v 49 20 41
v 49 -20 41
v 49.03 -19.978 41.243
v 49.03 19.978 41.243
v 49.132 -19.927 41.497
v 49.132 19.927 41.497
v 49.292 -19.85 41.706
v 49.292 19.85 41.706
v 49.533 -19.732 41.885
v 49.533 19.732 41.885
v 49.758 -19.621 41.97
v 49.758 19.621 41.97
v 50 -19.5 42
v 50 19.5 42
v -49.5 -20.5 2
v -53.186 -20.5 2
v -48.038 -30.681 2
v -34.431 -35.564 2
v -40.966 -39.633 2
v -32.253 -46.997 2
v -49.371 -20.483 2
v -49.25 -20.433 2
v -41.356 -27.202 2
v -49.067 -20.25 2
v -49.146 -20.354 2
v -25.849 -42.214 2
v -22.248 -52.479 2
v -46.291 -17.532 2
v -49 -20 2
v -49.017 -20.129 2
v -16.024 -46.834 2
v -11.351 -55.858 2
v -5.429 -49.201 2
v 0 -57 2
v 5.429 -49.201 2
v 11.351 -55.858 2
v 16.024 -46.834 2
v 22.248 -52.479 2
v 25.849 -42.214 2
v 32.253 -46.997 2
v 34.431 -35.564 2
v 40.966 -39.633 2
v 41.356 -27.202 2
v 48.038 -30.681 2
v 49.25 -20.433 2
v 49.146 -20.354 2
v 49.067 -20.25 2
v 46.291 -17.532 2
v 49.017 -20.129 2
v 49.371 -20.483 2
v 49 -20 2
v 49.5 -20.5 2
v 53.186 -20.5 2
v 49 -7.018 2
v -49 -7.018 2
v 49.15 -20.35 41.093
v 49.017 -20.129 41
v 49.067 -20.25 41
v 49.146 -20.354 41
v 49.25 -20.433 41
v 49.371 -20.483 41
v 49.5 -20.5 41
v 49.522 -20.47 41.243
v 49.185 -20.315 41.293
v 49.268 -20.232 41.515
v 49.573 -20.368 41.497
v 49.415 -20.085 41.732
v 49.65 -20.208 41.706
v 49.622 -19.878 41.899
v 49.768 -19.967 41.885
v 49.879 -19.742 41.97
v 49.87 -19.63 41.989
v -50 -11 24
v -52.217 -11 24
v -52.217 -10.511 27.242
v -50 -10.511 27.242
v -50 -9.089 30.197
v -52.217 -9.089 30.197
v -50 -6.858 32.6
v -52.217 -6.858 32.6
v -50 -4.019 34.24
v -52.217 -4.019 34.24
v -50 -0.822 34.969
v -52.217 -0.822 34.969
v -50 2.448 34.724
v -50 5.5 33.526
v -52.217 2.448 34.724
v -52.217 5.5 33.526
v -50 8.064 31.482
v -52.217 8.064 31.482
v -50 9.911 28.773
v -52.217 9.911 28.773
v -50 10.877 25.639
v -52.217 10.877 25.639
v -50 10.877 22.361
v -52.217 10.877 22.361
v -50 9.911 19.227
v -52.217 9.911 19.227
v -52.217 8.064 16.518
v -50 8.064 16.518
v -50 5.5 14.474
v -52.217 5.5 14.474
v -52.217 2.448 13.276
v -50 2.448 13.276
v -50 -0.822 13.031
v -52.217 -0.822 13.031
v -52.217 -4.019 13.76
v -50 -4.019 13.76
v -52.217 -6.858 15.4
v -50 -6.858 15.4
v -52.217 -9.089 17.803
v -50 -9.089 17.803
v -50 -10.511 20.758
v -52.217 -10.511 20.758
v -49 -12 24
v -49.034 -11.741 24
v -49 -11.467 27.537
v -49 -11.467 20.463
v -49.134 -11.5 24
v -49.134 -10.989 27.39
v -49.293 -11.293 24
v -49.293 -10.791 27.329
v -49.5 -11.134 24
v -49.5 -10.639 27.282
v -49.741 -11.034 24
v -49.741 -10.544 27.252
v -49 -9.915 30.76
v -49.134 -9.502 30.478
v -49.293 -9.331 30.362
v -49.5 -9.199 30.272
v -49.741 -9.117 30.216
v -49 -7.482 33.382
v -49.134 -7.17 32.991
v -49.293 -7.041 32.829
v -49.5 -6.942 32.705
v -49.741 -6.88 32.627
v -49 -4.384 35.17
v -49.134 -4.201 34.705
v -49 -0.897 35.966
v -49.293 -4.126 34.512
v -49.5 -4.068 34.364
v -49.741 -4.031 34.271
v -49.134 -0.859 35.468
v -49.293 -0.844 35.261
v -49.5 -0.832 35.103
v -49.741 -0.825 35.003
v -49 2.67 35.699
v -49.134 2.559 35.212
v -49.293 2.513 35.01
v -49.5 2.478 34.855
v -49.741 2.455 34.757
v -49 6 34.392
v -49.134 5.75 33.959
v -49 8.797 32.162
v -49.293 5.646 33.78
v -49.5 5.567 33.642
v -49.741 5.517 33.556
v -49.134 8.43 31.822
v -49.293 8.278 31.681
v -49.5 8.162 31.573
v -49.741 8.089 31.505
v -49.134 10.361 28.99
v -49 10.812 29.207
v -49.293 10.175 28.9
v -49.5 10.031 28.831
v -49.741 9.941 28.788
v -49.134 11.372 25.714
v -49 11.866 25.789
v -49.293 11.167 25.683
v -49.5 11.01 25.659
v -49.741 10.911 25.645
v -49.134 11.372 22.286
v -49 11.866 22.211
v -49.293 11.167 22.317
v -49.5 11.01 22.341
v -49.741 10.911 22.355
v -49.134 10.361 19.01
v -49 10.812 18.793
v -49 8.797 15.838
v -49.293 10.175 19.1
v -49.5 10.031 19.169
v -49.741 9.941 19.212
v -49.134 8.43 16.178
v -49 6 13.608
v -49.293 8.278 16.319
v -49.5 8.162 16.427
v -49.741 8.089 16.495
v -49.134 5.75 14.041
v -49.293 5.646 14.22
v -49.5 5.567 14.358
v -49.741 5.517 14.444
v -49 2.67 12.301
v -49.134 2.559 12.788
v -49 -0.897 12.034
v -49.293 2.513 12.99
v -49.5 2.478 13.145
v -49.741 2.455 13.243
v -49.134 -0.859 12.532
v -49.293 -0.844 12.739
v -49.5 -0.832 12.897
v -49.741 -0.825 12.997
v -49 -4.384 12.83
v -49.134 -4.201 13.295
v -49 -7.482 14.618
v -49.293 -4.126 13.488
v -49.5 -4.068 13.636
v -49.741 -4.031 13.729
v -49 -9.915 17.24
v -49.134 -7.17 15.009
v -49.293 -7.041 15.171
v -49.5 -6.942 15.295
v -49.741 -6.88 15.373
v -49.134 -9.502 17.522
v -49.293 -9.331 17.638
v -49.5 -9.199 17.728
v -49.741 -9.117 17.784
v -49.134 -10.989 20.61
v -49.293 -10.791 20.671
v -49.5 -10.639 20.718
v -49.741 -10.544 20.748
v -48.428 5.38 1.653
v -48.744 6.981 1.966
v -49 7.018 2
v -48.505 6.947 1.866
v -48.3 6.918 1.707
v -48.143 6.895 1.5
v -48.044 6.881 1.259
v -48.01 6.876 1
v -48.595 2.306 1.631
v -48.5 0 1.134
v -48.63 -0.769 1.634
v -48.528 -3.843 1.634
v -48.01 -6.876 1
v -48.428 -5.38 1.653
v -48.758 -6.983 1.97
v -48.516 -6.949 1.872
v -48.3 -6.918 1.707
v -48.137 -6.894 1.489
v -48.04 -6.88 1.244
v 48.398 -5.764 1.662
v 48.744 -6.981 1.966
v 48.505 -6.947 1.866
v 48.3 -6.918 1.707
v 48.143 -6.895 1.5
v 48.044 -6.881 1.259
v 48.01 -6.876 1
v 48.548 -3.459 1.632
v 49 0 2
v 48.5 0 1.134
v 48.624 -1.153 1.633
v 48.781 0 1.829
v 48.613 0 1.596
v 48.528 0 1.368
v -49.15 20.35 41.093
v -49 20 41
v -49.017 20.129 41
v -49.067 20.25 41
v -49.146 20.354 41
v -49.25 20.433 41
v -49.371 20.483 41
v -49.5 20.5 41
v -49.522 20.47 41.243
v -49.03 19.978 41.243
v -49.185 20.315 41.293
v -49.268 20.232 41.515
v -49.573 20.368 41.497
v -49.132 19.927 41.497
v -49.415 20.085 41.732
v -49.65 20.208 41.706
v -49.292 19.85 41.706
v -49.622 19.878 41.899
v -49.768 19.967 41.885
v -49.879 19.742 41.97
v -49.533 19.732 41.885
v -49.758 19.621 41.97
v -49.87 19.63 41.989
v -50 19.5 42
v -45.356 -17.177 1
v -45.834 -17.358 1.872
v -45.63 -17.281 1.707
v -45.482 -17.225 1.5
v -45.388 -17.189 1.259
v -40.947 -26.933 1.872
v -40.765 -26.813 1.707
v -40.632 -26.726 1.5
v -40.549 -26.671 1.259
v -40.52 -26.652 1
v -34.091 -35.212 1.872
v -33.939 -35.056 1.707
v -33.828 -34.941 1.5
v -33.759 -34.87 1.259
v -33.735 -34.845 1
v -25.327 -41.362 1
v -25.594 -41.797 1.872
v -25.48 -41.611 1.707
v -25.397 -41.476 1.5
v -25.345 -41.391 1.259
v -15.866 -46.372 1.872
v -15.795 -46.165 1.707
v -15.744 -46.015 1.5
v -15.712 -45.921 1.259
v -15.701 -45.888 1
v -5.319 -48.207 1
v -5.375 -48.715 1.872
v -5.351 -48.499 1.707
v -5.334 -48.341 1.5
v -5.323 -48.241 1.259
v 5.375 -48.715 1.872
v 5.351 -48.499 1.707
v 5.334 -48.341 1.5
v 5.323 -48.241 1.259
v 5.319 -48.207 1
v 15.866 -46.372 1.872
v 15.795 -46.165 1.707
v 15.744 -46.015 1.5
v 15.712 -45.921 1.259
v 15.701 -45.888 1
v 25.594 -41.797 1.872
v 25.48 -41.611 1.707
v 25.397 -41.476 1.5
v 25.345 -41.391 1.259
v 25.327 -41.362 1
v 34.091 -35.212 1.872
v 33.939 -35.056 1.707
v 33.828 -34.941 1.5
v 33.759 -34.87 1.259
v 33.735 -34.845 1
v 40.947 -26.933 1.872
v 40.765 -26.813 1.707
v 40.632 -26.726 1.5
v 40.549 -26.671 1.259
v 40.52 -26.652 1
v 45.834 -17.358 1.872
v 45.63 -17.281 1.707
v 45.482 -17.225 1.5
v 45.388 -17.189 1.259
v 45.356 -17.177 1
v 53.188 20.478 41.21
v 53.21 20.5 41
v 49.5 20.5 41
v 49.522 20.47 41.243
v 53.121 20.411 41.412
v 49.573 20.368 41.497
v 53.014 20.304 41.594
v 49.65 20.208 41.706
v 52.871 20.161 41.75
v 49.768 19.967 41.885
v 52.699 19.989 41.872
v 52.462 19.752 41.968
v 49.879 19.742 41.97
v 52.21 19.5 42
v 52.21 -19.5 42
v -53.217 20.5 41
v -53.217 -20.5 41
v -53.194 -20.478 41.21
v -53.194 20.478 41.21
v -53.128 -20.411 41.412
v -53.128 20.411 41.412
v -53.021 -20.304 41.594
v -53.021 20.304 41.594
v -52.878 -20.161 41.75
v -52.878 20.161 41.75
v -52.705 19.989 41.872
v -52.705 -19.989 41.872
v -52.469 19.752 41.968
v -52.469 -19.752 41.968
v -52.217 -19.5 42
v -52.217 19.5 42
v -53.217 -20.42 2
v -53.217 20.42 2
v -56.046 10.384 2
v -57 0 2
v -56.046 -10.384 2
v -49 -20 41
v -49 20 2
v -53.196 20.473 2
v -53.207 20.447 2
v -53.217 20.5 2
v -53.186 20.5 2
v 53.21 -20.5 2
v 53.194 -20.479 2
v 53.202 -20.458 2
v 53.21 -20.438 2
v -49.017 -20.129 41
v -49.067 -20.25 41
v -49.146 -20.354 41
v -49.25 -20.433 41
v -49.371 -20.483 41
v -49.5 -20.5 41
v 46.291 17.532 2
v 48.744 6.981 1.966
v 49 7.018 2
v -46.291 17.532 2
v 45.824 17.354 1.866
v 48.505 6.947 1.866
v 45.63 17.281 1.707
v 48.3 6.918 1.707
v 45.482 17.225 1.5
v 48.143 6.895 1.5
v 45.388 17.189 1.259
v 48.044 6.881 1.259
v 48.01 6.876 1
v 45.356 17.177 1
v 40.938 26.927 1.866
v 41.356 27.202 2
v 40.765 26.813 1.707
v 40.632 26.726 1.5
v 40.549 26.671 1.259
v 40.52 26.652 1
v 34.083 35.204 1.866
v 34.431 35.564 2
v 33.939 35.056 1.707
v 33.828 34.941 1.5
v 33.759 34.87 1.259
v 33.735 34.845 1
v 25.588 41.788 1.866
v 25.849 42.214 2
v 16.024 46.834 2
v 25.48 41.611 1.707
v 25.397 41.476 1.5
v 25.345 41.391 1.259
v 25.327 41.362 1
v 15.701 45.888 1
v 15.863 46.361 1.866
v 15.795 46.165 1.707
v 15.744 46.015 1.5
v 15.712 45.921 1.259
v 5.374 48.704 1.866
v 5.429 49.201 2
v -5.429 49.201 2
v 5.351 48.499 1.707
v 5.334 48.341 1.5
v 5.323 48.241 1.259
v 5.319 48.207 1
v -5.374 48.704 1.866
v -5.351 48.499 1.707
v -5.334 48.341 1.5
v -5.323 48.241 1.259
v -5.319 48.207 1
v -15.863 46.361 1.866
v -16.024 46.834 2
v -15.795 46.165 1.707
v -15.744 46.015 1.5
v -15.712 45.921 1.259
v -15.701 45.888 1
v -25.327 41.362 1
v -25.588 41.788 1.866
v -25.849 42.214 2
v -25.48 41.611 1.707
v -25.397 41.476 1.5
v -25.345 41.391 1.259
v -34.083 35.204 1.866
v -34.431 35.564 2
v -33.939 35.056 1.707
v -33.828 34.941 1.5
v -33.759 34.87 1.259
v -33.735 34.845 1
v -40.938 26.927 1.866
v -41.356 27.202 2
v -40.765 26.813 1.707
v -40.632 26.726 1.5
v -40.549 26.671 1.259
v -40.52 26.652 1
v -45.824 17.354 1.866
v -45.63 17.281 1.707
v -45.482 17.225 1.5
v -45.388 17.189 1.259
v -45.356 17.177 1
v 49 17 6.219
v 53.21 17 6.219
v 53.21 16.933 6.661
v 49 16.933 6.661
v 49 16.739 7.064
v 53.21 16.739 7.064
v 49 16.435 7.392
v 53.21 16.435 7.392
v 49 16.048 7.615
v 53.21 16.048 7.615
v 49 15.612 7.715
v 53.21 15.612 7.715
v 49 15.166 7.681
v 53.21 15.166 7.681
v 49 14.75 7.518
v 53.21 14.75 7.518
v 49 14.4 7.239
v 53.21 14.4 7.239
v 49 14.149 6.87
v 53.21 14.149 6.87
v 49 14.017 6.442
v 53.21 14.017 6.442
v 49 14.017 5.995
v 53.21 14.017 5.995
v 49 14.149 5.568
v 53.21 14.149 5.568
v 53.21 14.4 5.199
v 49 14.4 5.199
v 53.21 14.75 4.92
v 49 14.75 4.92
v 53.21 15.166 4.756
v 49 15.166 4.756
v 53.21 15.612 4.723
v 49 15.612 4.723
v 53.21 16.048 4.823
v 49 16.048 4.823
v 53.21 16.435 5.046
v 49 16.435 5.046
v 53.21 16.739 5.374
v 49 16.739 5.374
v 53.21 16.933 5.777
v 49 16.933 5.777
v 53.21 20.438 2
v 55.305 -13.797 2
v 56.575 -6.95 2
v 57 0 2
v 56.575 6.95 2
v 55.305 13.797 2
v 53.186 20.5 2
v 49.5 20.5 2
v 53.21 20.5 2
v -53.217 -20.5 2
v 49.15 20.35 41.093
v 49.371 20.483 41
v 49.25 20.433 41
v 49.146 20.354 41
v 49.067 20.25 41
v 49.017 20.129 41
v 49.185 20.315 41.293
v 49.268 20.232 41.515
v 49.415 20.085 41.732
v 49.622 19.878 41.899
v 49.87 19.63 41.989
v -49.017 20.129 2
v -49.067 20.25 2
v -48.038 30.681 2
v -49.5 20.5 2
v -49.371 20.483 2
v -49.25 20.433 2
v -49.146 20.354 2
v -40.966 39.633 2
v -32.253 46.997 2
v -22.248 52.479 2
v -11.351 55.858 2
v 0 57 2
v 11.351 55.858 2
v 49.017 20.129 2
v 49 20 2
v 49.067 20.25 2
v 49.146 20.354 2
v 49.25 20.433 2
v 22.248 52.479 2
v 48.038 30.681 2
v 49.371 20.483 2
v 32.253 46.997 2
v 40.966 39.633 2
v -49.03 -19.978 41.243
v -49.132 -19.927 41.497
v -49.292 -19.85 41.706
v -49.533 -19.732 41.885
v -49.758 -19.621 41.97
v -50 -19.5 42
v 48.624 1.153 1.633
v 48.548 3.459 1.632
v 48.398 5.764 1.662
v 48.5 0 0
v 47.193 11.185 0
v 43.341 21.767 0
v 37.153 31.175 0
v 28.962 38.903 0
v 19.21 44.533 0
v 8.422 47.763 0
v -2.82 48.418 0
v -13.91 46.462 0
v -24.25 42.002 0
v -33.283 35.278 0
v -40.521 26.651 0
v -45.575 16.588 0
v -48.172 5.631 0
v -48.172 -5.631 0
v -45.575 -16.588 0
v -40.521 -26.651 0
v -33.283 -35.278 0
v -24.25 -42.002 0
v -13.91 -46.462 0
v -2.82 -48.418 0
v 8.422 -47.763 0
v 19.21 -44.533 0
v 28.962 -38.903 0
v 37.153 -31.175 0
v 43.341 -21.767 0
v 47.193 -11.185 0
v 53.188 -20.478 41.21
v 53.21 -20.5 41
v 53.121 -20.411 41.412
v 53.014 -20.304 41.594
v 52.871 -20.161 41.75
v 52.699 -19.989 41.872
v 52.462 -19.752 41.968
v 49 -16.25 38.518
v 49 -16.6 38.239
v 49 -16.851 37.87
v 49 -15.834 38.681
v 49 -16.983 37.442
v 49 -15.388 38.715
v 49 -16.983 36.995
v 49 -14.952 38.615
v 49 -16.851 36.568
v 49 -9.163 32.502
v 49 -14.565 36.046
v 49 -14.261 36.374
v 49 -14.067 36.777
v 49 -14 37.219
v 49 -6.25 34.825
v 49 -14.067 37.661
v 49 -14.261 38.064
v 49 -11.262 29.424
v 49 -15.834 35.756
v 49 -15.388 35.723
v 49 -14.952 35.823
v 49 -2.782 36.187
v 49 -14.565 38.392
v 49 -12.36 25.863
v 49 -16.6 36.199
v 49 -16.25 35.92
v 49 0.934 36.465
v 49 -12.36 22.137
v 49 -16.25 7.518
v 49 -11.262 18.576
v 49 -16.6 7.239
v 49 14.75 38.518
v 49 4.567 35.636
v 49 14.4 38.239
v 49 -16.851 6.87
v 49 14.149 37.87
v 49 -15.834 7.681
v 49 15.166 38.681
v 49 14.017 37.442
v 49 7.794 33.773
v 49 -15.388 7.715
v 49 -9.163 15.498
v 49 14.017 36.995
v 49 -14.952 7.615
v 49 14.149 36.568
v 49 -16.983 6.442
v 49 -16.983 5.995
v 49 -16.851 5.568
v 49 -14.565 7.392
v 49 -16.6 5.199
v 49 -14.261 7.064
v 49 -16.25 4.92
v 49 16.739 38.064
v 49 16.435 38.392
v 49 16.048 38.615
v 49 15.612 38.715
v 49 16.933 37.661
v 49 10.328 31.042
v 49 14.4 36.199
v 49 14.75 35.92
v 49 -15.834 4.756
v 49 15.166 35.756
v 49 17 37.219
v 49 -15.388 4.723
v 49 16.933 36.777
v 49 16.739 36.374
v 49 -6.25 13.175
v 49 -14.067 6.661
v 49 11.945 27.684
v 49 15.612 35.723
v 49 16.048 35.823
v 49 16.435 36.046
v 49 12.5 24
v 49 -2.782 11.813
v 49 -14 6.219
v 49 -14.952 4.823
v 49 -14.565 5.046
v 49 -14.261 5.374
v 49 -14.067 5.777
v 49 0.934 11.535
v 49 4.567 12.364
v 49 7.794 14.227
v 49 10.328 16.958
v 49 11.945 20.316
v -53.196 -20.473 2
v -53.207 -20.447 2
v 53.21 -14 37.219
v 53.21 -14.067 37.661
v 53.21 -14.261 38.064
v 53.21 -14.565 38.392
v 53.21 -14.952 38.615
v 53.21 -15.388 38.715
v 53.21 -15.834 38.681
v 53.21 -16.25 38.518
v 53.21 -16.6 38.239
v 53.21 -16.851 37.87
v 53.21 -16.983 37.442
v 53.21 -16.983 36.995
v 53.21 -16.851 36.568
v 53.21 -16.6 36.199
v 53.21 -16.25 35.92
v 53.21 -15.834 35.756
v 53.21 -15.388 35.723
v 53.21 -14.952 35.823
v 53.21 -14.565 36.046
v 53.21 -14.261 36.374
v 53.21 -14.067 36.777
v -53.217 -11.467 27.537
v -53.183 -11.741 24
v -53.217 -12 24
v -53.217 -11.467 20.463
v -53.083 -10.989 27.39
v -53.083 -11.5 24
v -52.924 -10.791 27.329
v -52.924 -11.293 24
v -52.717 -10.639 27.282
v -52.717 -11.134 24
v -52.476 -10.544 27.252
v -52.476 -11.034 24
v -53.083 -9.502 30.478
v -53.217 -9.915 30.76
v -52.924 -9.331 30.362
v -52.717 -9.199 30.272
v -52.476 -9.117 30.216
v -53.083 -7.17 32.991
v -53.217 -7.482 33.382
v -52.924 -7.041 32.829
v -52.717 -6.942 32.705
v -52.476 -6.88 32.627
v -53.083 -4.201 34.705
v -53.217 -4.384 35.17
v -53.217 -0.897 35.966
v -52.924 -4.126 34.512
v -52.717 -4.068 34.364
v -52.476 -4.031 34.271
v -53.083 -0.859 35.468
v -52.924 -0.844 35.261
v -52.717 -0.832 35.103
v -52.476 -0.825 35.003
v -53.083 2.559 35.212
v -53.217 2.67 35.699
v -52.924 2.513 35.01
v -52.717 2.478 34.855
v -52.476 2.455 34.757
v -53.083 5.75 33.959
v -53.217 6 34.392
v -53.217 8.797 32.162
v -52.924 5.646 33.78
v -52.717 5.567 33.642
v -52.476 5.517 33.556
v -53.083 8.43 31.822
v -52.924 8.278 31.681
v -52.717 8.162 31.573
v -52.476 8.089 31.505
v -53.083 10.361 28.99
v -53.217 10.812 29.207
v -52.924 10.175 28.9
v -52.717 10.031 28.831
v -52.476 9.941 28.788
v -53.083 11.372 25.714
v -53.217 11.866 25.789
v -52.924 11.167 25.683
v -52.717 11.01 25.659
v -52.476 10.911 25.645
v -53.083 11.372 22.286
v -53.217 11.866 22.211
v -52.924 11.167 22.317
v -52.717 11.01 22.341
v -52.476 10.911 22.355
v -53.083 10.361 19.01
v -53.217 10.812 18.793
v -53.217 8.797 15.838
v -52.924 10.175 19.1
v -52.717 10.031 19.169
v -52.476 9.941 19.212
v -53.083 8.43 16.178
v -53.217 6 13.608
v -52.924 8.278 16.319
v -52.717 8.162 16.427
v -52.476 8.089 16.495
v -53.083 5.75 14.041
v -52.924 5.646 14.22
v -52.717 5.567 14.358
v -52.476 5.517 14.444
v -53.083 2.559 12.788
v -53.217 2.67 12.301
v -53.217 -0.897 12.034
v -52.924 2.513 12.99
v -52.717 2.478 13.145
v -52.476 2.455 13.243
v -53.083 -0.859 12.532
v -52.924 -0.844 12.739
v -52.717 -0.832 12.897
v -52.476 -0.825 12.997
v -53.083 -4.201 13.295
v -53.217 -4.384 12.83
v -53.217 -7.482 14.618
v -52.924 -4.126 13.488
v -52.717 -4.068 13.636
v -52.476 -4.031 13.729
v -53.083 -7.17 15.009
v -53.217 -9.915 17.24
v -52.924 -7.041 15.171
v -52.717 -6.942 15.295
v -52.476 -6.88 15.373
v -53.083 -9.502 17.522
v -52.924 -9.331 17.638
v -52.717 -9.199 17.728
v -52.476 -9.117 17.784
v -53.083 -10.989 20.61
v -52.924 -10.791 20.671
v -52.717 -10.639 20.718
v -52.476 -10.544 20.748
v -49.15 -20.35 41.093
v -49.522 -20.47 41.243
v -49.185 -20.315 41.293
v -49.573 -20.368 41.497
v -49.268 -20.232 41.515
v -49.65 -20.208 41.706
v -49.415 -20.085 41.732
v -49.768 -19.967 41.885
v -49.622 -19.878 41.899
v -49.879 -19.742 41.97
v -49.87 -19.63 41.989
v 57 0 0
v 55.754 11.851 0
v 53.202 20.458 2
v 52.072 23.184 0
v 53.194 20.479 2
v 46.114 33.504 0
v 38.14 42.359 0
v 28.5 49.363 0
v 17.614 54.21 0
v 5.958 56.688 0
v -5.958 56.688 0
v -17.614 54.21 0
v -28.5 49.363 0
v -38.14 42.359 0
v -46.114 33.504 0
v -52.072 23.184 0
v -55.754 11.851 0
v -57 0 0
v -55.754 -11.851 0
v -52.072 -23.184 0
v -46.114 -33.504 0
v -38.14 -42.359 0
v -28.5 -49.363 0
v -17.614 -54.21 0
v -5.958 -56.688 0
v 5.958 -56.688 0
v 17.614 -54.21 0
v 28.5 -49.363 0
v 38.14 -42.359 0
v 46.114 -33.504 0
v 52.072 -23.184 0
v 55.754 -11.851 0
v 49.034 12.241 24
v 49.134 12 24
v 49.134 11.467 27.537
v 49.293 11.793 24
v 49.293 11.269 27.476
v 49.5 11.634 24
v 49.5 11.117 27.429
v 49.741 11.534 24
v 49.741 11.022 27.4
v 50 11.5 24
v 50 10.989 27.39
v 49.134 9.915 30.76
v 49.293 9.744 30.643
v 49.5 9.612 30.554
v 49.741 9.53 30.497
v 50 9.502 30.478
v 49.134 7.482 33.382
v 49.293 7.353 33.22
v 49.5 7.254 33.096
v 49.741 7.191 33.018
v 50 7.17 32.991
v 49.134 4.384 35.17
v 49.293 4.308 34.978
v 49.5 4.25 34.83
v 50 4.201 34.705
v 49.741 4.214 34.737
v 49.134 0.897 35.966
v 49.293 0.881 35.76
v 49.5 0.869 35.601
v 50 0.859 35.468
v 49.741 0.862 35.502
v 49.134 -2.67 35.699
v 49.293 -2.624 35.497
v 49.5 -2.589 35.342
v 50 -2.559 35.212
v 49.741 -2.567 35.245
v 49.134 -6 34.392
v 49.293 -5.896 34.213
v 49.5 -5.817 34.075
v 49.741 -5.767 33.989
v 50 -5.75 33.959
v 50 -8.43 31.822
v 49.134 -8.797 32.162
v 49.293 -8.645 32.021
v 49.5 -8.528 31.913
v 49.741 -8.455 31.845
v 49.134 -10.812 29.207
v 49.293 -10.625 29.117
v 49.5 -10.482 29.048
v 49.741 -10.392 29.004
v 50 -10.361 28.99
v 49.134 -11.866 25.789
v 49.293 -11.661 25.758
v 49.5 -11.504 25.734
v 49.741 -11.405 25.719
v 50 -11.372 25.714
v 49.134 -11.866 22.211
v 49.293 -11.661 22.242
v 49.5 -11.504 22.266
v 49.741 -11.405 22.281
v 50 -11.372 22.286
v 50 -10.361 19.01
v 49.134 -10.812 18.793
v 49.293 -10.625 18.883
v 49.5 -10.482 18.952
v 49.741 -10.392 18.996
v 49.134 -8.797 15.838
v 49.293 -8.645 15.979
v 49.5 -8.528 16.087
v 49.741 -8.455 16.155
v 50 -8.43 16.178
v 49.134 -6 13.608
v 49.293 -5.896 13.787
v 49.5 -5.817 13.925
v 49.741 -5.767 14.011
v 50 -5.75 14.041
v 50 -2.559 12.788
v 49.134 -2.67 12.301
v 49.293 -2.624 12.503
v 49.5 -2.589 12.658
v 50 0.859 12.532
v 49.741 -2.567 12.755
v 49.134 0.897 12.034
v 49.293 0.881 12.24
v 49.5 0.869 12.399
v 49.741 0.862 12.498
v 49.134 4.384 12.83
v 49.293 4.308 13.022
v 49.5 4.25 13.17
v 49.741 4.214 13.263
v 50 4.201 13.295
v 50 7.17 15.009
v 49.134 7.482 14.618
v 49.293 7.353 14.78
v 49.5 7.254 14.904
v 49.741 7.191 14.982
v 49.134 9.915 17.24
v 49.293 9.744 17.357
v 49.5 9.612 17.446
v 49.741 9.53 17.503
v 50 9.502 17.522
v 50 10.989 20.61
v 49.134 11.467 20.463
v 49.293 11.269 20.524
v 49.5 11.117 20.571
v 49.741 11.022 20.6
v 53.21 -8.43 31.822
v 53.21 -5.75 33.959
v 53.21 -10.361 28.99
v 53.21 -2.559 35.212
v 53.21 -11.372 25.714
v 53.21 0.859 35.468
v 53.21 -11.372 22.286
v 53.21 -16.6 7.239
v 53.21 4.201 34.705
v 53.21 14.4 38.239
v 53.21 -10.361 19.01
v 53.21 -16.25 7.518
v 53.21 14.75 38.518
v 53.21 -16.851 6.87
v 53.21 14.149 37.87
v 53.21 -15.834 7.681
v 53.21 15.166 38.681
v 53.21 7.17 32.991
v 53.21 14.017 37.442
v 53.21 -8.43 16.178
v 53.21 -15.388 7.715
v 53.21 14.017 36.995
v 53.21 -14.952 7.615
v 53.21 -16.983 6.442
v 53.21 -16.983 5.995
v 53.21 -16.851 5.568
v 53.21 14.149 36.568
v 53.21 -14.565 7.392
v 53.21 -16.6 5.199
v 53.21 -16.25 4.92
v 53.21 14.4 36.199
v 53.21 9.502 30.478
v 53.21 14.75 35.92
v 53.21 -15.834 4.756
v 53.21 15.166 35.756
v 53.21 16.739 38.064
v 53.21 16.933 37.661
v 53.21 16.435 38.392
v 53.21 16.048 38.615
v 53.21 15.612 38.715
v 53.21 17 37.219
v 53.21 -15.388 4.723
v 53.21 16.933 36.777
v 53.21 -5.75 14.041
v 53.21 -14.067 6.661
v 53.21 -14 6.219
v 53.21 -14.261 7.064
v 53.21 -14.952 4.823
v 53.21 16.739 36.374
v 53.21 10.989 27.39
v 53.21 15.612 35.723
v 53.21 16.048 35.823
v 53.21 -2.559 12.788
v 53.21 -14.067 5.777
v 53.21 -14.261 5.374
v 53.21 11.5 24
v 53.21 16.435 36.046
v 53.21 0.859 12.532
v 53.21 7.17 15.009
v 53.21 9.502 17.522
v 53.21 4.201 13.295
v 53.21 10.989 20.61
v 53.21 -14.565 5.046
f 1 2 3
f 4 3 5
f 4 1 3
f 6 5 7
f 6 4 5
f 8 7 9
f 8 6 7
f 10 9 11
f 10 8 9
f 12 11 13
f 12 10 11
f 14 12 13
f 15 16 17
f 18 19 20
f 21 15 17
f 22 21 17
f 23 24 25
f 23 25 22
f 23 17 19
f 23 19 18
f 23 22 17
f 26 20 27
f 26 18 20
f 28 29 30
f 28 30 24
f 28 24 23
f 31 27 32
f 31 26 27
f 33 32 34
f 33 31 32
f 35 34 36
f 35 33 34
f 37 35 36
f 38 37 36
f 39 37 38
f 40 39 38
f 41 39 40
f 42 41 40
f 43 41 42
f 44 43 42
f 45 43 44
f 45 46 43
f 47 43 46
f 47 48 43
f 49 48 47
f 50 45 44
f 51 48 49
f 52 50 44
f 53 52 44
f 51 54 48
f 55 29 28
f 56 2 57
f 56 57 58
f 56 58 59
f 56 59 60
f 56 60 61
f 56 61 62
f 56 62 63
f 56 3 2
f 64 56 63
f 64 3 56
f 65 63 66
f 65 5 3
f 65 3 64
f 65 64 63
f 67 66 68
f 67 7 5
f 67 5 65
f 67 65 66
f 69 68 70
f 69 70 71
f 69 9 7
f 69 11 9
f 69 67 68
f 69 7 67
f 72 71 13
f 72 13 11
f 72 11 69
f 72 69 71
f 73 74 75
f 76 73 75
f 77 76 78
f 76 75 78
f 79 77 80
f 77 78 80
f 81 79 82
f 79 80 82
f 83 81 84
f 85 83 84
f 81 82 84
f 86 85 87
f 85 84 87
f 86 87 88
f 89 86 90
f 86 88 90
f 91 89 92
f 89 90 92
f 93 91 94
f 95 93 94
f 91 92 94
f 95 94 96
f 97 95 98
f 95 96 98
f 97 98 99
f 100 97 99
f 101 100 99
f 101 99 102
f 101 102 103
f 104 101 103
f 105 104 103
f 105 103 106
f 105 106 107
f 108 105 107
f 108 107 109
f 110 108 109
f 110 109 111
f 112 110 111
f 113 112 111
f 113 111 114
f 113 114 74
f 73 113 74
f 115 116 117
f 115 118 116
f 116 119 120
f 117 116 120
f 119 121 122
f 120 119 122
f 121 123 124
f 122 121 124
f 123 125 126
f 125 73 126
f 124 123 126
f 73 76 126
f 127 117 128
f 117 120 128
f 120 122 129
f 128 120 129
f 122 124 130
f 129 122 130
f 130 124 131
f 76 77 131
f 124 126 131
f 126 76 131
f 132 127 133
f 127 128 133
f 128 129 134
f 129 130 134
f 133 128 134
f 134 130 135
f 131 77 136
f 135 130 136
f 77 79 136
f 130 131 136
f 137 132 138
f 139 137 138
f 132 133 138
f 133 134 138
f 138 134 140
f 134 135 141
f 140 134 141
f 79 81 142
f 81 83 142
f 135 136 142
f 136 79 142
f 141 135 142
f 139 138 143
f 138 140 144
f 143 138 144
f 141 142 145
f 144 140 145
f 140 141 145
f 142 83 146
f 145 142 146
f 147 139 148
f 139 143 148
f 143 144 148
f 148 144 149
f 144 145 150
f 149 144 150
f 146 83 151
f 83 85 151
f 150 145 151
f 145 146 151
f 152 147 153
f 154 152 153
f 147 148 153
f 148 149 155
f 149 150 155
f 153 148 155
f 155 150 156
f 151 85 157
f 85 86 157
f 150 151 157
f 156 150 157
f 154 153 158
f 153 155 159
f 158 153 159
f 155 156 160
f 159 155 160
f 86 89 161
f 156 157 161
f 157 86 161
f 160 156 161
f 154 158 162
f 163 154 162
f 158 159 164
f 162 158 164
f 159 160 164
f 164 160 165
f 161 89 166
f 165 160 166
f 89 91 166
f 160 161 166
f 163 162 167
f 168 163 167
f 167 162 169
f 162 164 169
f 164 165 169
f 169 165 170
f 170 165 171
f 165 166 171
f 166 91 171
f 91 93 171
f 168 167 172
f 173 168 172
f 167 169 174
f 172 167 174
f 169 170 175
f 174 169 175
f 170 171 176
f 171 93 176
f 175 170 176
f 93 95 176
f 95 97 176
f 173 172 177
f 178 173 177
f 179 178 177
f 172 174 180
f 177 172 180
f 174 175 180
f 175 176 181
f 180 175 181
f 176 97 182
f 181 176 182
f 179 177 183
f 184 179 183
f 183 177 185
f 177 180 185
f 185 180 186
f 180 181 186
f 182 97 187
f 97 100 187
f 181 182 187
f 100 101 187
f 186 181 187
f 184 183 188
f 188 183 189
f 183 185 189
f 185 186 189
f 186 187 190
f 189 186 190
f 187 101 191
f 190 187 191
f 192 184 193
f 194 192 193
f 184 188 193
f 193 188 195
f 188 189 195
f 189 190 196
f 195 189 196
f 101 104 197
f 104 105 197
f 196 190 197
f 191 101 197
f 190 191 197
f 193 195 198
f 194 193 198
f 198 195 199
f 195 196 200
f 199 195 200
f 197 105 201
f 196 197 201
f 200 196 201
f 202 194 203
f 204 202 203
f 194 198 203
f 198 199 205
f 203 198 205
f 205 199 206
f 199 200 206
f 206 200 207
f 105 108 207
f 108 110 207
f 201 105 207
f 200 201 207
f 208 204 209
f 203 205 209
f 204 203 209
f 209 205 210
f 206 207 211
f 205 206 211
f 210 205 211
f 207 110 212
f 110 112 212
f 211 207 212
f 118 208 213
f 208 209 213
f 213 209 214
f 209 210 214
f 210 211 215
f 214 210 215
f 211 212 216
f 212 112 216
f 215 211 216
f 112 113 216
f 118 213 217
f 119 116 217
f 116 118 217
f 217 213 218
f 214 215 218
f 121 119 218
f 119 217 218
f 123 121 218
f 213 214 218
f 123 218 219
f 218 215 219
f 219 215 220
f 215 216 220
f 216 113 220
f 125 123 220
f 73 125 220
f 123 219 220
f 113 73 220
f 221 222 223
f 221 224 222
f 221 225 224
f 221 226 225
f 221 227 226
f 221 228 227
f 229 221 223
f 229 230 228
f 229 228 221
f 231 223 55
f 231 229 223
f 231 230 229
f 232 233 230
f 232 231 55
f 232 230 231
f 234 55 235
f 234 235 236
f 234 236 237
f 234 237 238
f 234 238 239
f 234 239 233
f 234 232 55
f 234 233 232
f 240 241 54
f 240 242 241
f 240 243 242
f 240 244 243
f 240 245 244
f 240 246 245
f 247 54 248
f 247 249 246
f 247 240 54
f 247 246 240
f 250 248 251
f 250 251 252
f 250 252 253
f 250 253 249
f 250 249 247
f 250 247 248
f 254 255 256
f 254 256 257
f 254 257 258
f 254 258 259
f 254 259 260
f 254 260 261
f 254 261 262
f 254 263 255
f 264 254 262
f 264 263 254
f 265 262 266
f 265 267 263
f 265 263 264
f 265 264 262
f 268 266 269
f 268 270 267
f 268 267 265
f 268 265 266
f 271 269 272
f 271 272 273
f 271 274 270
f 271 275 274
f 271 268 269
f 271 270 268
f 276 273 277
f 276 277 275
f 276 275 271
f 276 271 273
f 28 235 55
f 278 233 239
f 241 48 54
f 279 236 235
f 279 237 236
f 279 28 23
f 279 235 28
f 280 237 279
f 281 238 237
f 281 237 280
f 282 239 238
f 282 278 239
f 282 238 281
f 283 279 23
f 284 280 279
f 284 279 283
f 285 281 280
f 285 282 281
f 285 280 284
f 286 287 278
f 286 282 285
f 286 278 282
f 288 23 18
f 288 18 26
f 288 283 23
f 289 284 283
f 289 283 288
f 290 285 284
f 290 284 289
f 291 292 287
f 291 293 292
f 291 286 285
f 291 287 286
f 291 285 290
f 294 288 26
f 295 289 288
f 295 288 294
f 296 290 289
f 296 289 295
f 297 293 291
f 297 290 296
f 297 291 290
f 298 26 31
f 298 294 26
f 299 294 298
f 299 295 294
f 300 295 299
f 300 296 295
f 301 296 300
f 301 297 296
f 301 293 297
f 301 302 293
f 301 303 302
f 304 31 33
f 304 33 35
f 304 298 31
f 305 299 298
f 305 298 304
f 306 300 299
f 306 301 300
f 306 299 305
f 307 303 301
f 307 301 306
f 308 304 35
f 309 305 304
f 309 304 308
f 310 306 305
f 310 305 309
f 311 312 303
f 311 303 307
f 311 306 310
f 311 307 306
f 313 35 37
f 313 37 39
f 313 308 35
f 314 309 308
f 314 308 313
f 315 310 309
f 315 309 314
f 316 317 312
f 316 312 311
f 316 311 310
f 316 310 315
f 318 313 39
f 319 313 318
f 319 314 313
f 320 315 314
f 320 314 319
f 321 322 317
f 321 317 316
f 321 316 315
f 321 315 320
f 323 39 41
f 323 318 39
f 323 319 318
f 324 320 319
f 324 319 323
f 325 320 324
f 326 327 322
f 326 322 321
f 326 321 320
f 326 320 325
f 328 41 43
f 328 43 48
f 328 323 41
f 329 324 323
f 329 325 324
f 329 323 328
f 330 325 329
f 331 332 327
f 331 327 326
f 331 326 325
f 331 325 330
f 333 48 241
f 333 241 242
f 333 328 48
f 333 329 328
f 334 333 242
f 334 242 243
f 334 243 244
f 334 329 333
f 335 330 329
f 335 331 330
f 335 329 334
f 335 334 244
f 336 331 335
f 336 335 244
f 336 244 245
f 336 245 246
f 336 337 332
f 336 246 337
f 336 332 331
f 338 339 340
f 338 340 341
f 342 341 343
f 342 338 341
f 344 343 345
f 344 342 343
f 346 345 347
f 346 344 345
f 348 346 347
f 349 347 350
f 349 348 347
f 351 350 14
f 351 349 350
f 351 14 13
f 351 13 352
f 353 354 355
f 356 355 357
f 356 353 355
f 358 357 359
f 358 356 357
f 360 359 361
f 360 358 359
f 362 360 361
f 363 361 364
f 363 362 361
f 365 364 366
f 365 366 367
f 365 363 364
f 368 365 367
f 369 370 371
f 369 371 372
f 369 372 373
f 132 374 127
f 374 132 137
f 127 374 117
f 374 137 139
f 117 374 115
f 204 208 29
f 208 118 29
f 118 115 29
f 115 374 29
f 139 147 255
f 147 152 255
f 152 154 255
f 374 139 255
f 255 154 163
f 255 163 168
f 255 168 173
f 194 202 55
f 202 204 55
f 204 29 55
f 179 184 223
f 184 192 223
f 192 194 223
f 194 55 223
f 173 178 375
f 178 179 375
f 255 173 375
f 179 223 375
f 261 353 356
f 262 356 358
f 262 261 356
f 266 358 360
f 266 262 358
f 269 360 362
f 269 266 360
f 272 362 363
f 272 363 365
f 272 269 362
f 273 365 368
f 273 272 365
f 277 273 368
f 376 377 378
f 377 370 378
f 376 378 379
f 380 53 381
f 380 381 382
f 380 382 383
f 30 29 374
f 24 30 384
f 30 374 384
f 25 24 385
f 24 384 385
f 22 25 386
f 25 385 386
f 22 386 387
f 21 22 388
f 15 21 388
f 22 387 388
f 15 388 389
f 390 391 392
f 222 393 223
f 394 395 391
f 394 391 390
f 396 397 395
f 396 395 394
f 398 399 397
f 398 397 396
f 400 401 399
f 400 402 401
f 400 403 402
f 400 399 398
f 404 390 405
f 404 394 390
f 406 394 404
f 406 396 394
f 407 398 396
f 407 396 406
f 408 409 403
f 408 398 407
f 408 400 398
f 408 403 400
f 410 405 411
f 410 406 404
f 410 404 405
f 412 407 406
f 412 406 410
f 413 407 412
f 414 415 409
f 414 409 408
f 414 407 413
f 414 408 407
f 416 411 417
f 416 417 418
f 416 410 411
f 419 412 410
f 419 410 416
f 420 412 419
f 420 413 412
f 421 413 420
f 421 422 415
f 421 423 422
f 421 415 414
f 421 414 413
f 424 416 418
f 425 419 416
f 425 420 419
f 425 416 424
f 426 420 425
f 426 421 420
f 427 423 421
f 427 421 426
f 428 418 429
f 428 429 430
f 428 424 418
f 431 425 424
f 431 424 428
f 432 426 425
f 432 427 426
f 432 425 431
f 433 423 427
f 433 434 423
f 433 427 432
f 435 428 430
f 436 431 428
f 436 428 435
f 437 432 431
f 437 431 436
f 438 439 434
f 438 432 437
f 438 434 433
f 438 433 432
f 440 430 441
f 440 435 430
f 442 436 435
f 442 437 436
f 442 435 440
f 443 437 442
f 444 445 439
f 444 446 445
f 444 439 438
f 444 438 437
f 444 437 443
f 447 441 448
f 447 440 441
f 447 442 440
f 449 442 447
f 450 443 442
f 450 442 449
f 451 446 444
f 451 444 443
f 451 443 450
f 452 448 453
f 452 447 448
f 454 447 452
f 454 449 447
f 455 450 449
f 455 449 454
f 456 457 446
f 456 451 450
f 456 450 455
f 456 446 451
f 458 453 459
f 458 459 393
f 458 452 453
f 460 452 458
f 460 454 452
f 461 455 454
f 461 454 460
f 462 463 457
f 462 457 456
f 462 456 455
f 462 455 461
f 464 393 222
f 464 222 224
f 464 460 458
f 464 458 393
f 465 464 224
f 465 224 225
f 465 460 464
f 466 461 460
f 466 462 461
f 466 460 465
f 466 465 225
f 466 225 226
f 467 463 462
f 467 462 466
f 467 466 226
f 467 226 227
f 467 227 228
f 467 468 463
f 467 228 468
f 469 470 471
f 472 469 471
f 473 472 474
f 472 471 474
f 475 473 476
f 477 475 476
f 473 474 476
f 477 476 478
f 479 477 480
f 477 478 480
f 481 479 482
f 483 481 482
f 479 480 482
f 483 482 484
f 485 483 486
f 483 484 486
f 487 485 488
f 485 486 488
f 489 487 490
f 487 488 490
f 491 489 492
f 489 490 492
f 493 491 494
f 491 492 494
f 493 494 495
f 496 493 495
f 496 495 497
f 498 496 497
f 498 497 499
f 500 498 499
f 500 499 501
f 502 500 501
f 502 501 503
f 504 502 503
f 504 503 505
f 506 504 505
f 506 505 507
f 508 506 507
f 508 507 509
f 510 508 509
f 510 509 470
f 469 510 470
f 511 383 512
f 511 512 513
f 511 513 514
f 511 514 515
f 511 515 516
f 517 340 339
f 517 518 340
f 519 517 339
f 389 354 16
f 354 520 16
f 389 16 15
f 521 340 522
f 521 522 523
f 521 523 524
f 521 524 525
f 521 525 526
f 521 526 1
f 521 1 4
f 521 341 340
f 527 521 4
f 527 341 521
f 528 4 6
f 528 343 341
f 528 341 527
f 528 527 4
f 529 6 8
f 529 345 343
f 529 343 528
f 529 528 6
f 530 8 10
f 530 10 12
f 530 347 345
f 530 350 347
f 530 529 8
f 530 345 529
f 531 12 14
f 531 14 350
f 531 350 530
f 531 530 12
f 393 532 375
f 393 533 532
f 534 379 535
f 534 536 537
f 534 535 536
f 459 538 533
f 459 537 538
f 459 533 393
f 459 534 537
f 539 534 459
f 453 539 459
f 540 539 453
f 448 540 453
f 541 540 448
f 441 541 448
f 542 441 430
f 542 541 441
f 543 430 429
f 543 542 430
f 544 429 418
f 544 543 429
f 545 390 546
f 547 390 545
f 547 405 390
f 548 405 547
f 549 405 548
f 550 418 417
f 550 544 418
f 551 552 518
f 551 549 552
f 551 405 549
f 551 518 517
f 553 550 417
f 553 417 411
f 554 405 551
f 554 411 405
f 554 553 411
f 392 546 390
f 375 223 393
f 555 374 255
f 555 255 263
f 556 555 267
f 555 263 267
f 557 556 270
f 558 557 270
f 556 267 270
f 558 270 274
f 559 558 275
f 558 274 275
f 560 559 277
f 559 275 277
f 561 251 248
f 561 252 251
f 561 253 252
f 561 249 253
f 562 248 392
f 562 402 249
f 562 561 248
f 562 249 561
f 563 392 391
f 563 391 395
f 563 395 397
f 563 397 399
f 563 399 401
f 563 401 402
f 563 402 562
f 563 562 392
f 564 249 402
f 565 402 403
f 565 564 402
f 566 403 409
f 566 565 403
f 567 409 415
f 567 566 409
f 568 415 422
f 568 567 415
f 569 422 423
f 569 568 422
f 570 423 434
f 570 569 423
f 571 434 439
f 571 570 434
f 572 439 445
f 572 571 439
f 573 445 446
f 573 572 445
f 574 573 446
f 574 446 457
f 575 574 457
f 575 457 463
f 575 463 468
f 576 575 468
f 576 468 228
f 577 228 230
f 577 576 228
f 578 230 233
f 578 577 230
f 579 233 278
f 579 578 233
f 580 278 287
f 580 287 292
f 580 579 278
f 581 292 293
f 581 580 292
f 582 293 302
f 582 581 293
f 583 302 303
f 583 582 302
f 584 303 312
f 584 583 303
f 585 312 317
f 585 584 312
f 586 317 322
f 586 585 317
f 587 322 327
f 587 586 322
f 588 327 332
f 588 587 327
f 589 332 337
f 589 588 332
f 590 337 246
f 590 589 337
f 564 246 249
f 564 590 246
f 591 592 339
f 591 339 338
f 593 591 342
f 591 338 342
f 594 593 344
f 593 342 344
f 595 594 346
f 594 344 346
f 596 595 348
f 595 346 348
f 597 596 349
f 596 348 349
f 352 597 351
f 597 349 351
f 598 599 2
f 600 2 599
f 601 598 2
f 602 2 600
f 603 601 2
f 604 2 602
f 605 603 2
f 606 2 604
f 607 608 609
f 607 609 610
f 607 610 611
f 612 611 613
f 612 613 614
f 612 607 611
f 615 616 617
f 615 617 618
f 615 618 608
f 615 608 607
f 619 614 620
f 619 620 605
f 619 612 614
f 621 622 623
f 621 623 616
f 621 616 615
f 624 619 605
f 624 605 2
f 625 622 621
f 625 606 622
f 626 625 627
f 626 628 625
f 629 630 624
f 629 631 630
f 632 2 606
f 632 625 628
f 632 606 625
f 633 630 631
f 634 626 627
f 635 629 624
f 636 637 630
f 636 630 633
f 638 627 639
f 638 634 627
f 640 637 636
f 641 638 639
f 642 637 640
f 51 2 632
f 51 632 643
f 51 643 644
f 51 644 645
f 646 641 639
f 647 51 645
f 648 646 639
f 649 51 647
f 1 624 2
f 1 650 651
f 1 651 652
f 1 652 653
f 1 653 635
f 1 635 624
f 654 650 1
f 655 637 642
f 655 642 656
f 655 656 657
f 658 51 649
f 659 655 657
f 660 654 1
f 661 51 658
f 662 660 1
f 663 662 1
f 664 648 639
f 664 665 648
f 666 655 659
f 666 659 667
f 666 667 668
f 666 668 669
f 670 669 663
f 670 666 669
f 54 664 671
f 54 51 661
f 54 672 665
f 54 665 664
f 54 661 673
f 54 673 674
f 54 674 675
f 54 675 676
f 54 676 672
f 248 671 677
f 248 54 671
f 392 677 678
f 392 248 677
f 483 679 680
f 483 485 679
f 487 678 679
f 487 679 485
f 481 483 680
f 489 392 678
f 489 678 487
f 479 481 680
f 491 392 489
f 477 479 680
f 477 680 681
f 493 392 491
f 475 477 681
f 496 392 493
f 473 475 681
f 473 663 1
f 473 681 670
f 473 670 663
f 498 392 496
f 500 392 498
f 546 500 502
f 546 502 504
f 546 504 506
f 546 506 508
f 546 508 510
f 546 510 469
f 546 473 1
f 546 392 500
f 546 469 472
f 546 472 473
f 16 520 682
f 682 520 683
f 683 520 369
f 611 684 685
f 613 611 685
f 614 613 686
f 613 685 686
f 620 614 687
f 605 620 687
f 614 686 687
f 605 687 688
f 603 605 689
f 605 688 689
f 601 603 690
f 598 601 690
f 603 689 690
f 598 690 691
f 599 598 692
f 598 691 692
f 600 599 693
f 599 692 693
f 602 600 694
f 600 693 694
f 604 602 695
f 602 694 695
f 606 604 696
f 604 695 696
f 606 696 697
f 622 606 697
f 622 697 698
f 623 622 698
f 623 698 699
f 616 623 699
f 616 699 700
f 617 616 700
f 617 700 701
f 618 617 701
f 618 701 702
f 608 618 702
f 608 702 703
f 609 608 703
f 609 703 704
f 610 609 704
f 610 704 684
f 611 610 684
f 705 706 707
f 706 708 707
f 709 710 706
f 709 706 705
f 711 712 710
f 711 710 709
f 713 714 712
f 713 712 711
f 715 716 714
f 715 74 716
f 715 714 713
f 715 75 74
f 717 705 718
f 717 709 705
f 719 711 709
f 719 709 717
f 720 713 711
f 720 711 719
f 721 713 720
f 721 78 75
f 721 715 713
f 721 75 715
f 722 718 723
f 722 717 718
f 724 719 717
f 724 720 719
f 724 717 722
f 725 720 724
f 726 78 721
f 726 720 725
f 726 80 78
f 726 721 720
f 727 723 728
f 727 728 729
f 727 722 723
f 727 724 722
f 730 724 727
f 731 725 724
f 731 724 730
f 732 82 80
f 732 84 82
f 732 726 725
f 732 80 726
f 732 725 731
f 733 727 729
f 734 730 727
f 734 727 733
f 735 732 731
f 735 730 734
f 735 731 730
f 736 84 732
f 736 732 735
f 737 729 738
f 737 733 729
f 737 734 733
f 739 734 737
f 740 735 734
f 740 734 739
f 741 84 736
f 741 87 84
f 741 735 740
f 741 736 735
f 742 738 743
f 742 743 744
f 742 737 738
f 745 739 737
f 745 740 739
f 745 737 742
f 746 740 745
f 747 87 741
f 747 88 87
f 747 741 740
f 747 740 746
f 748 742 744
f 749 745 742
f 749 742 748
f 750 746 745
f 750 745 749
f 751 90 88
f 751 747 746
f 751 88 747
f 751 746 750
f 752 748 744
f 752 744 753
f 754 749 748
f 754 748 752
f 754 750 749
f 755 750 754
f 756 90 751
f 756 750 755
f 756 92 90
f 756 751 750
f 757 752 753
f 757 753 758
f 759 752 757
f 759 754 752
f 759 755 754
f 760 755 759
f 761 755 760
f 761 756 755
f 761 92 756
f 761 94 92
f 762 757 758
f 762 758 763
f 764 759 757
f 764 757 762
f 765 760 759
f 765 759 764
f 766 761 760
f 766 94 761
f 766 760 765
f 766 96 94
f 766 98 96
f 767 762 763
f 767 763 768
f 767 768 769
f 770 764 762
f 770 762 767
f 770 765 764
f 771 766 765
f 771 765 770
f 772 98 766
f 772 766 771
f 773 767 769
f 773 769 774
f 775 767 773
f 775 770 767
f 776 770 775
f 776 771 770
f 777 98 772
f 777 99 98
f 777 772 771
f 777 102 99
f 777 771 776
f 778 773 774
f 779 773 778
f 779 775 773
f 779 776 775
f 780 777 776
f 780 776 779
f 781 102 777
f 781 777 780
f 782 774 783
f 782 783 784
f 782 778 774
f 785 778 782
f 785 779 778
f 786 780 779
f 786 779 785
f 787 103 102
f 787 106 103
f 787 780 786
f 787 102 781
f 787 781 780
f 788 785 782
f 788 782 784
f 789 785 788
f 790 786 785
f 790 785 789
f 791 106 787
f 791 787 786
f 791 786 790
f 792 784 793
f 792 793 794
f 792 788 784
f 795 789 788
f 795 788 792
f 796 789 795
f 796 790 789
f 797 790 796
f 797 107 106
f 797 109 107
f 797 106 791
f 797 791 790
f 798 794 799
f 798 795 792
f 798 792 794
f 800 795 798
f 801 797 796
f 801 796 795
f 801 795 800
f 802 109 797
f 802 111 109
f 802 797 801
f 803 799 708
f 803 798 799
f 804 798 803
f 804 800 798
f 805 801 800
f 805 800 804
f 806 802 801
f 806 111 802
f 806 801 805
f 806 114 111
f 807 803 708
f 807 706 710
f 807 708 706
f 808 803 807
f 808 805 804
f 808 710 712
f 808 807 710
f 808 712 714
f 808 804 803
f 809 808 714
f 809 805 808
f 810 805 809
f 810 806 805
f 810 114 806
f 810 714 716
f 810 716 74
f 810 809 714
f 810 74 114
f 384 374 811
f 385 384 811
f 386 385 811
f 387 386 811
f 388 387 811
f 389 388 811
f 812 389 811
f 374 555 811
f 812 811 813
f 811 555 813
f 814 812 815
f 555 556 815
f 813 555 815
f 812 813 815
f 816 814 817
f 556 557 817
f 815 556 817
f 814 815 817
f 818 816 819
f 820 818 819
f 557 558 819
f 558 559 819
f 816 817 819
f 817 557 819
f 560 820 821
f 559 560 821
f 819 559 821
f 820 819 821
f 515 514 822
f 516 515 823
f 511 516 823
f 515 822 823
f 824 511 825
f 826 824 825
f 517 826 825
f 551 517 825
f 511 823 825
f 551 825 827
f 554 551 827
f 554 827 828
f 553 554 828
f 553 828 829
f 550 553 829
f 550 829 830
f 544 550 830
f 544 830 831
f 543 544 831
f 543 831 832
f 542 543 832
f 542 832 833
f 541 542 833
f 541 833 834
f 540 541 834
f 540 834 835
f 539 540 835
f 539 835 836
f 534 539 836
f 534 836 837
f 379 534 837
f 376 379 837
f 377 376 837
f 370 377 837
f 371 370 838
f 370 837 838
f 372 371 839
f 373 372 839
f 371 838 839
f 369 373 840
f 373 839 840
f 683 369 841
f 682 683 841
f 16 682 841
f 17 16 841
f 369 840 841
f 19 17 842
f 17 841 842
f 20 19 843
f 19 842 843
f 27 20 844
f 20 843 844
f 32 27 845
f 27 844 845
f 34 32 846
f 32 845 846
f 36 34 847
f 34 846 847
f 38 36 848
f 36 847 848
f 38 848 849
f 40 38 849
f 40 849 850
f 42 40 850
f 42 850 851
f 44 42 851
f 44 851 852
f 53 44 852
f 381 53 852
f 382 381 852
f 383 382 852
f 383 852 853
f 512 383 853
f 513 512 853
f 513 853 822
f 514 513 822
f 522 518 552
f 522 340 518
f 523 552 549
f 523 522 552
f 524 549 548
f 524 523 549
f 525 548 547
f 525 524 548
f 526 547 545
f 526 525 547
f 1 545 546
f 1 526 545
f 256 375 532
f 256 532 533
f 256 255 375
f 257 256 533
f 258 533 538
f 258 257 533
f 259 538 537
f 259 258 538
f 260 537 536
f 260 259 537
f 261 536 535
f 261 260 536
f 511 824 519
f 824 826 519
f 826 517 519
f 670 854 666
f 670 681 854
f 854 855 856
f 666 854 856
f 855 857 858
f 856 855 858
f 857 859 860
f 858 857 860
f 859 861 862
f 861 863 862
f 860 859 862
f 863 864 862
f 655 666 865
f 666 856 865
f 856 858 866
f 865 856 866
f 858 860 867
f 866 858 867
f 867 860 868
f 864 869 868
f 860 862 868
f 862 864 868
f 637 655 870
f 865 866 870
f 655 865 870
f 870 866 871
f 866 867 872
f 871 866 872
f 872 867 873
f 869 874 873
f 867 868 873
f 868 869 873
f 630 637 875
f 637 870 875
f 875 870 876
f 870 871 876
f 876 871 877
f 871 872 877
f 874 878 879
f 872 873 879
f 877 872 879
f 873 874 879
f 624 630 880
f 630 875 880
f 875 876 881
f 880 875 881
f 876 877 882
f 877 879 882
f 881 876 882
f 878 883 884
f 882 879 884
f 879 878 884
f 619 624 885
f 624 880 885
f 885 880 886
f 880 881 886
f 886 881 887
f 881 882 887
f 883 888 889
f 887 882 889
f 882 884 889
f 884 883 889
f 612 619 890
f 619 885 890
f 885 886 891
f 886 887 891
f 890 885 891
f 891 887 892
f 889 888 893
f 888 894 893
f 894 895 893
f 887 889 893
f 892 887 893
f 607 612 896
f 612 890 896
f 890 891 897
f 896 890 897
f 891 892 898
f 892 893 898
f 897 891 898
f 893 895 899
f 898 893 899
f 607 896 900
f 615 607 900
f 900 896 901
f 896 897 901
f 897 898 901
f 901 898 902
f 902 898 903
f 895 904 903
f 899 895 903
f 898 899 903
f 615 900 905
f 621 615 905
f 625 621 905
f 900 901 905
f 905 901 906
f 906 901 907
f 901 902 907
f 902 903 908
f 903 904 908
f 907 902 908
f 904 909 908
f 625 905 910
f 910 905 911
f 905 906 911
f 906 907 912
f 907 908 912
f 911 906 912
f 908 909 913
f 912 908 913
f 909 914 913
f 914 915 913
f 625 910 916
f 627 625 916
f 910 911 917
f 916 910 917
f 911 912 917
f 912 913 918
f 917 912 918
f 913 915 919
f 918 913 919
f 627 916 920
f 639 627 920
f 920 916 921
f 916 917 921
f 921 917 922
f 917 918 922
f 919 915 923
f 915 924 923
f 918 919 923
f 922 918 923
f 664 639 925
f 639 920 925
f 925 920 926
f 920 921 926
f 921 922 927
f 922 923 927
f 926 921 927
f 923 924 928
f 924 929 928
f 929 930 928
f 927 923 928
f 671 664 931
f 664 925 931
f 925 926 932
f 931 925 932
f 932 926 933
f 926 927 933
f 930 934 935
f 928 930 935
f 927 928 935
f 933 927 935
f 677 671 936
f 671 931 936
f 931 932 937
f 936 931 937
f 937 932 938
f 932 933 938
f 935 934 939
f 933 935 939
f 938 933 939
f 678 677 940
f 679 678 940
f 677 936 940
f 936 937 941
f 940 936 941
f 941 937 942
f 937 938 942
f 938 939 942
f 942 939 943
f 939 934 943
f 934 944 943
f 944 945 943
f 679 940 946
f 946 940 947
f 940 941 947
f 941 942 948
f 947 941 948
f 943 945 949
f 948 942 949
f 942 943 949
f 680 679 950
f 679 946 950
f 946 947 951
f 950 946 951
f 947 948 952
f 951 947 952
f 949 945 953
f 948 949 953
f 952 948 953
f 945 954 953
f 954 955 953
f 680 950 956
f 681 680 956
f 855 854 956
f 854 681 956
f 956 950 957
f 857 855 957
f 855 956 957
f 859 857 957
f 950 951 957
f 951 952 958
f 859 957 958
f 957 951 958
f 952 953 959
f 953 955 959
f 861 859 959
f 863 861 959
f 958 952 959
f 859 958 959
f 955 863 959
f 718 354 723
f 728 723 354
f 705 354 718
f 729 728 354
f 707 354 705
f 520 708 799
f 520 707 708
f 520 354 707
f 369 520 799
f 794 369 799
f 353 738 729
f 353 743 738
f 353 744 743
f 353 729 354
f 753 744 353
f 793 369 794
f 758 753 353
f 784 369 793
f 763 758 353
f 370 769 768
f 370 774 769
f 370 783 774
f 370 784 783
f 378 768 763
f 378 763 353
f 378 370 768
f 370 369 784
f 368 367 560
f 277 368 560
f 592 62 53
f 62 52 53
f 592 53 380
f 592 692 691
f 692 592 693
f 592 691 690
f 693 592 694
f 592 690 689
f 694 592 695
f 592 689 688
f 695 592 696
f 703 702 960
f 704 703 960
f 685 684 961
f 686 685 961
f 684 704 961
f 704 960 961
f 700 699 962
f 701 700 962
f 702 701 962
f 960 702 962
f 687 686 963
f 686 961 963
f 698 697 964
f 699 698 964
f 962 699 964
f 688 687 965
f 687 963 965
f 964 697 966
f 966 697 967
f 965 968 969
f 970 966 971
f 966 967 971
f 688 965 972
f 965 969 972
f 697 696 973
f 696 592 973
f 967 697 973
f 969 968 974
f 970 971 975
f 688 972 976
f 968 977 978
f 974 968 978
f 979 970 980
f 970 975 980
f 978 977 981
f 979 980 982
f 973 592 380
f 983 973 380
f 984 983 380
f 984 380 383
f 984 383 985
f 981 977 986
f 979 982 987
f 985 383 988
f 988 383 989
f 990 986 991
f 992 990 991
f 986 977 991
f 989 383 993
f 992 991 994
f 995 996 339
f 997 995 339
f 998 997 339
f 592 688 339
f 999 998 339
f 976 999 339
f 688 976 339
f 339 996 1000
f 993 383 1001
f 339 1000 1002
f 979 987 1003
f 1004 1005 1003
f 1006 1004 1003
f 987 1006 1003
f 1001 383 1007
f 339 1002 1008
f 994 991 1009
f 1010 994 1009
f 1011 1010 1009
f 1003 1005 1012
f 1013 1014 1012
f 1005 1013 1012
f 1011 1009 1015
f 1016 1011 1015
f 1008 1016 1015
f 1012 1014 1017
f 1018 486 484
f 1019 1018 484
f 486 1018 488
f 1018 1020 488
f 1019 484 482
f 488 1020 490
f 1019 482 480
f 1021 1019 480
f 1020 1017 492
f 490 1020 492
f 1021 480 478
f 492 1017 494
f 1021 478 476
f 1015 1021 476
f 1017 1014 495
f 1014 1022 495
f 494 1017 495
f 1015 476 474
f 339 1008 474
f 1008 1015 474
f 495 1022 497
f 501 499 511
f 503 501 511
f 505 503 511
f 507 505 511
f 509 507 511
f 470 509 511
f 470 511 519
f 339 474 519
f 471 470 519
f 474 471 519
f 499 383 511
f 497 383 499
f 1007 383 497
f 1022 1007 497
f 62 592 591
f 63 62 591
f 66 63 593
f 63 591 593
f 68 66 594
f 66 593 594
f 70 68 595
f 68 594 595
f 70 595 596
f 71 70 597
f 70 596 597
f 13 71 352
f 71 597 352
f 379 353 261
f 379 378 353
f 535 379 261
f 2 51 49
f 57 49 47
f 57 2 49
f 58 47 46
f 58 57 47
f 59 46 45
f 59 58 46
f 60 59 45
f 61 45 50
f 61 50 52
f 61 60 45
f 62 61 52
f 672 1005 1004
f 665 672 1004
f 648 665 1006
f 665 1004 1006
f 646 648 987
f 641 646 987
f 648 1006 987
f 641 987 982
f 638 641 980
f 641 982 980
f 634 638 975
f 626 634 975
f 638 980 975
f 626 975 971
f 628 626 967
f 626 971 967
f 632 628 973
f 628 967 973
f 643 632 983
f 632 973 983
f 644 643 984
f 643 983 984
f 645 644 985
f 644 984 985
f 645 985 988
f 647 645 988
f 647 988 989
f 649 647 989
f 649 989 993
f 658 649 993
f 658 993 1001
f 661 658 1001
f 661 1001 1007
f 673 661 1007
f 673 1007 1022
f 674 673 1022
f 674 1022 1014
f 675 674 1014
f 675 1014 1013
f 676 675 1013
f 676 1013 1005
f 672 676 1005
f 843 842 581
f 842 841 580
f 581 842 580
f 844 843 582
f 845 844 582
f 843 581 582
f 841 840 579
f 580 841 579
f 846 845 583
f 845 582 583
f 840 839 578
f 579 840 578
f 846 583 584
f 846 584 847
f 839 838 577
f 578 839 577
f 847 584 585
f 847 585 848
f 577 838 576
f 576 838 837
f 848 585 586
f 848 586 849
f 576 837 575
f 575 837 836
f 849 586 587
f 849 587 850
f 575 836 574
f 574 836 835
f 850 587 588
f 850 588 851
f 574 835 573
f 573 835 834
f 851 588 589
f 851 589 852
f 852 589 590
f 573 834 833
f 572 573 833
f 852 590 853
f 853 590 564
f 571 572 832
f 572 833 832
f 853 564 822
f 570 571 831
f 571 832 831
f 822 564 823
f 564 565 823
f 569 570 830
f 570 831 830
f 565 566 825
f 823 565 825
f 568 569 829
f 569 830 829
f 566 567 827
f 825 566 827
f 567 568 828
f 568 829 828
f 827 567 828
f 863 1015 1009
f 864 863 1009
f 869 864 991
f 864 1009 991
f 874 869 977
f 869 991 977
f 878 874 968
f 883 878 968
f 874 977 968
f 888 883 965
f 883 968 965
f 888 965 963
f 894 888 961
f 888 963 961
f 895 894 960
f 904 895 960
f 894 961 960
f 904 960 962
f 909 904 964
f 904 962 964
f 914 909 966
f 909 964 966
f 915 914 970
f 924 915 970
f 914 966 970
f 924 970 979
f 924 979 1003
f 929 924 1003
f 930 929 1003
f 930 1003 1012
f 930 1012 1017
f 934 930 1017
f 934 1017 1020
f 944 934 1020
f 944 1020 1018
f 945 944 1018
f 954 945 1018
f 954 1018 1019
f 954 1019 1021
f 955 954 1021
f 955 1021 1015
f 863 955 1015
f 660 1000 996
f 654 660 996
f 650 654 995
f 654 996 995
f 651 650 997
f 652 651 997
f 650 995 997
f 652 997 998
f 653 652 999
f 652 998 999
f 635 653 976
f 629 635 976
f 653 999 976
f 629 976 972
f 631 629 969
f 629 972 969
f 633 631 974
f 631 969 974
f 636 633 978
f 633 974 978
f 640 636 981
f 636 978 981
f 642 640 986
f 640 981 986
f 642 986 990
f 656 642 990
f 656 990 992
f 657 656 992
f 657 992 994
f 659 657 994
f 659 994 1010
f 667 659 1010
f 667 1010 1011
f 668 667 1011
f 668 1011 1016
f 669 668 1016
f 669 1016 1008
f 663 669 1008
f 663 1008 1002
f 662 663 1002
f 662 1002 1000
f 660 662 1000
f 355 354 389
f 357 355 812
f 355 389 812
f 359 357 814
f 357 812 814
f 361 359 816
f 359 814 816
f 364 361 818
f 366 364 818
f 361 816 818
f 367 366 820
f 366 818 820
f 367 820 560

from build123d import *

# Parameters (mm, degrees)
SKETCH_R        = 57
SKETCH_R_2      = 48.5
PAD_DEPTH       = 2
SKETCH001_W     = 4.21681
SKETCH001_H     = 41
SKETCH001_W_2   = 4.21
PAD001_DEPTH    = 40
SKETCH002_R     = 1.5
SKETCH002_R_2   = 11.5
POCKET_DEPTH    = 5
SKETCH003_R     = 11
POCKET001_DEPTH = 5
FILLET_R        = 1
FILLET001_R     = 1
FILLET002_R     = 0.5
FILLET003_R     = 0.5
FILLET004_R     = 0.5
FILLET005_R     = 1
FILLET006_R     = 1
FILLET007_R     = 1
FILLET008_R     = 1


with BuildPart() as part:
    # Sketch → Pad (new body)
    with BuildSketch(Plane.XY):
        Circle(SKETCH_R)
        Circle(SKETCH_R_2, mode=Mode.SUBTRACT)
    extrude(amount=PAD_DEPTH)

    # Sketch001 → Pad001 (new body)
    with BuildSketch(Plane.XY.offset(2)):
        with Locations((-51.108405, 0)):
            Rectangle(SKETCH001_W, SKETCH001_H)
        with Locations((51.105, 0)):
            Rectangle(SKETCH001_W_2, SKETCH001_H)
    extrude(amount=PAD001_DEPTH)

    # Sketch002 → Pocket (cut)
    with BuildSketch(Plane.YZ.offset(53.21)):
        with Locations((-15.5, 6.218866)):
            Circle(SKETCH002_R)
        with Locations((-15.5, 37.218866)):
            Circle(SKETCH002_R)
        with Locations((15.5, 37.218866)):
            Circle(SKETCH002_R)
        with Locations((15.5, 6.218866)):
            Circle(SKETCH002_R)
        with Locations((0, 24)):
            Circle(SKETCH002_R_2)
    extrude(amount=-POCKET_DEPTH, mode=Mode.SUBTRACT)

    # Sketch003 → Pocket001 (cut)
    with BuildSketch(Plane(origin=(-53.21681, 0, 0), x_dir=(0, -1, 0), z_dir=(-1, 0, 0))):
        with Locations((0, 24)):
            Circle(SKETCH003_R)
    extrude(amount=-POCKET001_DEPTH, mode=Mode.SUBTRACT)

    # Fillet
    fillet_edges = [part.edges().sort_by_distance(p)[0] for p in [
        (51.105, 20.5, 42),
        (53.21, 0, 42),
        (51.105, -20.5, 42),
        (49, 0, 42),
    ]]
    fillet(fillet_edges, radius=FILLET_R)

    # Fillet001
    fillet001_edges = [part.edges().sort_by_distance(p)[0] for p in [
        (-51.108405, 20.5, 42),
        (-49, 0, 42),
        (-51.108405, -20.5, 42),
        (-53.21681, 0, 42),
    ]]
    fillet(fillet001_edges, radius=FILLET001_R)

    # Fillet002
    fillet002_edges = [part.edges().sort_by_distance(p)[0] for p in [
        (-49, 20.5, 21.5),
    ]]
    fillet(fillet002_edges, radius=FILLET002_R)

    # Fillet003
    fillet003_edges = [part.edges().sort_by_distance(p)[0] for p in [
        (49, 20.5, 21.5),
    ]]
    fillet(fillet003_edges, radius=FILLET003_R)

    # Fillet004
    fillet004_edges = [part.edges().sort_by_distance(p)[0] for p in [
        (-49, -20.5, 21.5),
        (49, -20.5, 21.5),
    ]]
    fillet(fillet004_edges, radius=FILLET004_R)

    # Fillet005
    fillet005_edges = [part.edges().sort_by_distance(p)[0] for p in [
        (-49, 11, 24),
    ]]
    fillet(fillet005_edges, radius=FILLET005_R)

    # Fillet006
    fillet006_edges = [part.edges().sort_by_distance(p)[0] for p in [
        (49, -11.5, 24),
    ]]
    fillet(fillet006_edges, radius=FILLET006_R)

    # Fillet007
    fillet007_edges = [part.edges().sort_by_distance(p)[0] for p in [
        (-53.21681, 11, 24),
    ]]
    fillet(fillet007_edges, radius=FILLET007_R)

    # Fillet008
    fillet008_edges = [part.edges().sort_by_distance(p)[0] for p in [
        (-48.5, 0, 2),
    ]]
    fillet(fillet008_edges, radius=FILLET008_R)


solid = part.part
